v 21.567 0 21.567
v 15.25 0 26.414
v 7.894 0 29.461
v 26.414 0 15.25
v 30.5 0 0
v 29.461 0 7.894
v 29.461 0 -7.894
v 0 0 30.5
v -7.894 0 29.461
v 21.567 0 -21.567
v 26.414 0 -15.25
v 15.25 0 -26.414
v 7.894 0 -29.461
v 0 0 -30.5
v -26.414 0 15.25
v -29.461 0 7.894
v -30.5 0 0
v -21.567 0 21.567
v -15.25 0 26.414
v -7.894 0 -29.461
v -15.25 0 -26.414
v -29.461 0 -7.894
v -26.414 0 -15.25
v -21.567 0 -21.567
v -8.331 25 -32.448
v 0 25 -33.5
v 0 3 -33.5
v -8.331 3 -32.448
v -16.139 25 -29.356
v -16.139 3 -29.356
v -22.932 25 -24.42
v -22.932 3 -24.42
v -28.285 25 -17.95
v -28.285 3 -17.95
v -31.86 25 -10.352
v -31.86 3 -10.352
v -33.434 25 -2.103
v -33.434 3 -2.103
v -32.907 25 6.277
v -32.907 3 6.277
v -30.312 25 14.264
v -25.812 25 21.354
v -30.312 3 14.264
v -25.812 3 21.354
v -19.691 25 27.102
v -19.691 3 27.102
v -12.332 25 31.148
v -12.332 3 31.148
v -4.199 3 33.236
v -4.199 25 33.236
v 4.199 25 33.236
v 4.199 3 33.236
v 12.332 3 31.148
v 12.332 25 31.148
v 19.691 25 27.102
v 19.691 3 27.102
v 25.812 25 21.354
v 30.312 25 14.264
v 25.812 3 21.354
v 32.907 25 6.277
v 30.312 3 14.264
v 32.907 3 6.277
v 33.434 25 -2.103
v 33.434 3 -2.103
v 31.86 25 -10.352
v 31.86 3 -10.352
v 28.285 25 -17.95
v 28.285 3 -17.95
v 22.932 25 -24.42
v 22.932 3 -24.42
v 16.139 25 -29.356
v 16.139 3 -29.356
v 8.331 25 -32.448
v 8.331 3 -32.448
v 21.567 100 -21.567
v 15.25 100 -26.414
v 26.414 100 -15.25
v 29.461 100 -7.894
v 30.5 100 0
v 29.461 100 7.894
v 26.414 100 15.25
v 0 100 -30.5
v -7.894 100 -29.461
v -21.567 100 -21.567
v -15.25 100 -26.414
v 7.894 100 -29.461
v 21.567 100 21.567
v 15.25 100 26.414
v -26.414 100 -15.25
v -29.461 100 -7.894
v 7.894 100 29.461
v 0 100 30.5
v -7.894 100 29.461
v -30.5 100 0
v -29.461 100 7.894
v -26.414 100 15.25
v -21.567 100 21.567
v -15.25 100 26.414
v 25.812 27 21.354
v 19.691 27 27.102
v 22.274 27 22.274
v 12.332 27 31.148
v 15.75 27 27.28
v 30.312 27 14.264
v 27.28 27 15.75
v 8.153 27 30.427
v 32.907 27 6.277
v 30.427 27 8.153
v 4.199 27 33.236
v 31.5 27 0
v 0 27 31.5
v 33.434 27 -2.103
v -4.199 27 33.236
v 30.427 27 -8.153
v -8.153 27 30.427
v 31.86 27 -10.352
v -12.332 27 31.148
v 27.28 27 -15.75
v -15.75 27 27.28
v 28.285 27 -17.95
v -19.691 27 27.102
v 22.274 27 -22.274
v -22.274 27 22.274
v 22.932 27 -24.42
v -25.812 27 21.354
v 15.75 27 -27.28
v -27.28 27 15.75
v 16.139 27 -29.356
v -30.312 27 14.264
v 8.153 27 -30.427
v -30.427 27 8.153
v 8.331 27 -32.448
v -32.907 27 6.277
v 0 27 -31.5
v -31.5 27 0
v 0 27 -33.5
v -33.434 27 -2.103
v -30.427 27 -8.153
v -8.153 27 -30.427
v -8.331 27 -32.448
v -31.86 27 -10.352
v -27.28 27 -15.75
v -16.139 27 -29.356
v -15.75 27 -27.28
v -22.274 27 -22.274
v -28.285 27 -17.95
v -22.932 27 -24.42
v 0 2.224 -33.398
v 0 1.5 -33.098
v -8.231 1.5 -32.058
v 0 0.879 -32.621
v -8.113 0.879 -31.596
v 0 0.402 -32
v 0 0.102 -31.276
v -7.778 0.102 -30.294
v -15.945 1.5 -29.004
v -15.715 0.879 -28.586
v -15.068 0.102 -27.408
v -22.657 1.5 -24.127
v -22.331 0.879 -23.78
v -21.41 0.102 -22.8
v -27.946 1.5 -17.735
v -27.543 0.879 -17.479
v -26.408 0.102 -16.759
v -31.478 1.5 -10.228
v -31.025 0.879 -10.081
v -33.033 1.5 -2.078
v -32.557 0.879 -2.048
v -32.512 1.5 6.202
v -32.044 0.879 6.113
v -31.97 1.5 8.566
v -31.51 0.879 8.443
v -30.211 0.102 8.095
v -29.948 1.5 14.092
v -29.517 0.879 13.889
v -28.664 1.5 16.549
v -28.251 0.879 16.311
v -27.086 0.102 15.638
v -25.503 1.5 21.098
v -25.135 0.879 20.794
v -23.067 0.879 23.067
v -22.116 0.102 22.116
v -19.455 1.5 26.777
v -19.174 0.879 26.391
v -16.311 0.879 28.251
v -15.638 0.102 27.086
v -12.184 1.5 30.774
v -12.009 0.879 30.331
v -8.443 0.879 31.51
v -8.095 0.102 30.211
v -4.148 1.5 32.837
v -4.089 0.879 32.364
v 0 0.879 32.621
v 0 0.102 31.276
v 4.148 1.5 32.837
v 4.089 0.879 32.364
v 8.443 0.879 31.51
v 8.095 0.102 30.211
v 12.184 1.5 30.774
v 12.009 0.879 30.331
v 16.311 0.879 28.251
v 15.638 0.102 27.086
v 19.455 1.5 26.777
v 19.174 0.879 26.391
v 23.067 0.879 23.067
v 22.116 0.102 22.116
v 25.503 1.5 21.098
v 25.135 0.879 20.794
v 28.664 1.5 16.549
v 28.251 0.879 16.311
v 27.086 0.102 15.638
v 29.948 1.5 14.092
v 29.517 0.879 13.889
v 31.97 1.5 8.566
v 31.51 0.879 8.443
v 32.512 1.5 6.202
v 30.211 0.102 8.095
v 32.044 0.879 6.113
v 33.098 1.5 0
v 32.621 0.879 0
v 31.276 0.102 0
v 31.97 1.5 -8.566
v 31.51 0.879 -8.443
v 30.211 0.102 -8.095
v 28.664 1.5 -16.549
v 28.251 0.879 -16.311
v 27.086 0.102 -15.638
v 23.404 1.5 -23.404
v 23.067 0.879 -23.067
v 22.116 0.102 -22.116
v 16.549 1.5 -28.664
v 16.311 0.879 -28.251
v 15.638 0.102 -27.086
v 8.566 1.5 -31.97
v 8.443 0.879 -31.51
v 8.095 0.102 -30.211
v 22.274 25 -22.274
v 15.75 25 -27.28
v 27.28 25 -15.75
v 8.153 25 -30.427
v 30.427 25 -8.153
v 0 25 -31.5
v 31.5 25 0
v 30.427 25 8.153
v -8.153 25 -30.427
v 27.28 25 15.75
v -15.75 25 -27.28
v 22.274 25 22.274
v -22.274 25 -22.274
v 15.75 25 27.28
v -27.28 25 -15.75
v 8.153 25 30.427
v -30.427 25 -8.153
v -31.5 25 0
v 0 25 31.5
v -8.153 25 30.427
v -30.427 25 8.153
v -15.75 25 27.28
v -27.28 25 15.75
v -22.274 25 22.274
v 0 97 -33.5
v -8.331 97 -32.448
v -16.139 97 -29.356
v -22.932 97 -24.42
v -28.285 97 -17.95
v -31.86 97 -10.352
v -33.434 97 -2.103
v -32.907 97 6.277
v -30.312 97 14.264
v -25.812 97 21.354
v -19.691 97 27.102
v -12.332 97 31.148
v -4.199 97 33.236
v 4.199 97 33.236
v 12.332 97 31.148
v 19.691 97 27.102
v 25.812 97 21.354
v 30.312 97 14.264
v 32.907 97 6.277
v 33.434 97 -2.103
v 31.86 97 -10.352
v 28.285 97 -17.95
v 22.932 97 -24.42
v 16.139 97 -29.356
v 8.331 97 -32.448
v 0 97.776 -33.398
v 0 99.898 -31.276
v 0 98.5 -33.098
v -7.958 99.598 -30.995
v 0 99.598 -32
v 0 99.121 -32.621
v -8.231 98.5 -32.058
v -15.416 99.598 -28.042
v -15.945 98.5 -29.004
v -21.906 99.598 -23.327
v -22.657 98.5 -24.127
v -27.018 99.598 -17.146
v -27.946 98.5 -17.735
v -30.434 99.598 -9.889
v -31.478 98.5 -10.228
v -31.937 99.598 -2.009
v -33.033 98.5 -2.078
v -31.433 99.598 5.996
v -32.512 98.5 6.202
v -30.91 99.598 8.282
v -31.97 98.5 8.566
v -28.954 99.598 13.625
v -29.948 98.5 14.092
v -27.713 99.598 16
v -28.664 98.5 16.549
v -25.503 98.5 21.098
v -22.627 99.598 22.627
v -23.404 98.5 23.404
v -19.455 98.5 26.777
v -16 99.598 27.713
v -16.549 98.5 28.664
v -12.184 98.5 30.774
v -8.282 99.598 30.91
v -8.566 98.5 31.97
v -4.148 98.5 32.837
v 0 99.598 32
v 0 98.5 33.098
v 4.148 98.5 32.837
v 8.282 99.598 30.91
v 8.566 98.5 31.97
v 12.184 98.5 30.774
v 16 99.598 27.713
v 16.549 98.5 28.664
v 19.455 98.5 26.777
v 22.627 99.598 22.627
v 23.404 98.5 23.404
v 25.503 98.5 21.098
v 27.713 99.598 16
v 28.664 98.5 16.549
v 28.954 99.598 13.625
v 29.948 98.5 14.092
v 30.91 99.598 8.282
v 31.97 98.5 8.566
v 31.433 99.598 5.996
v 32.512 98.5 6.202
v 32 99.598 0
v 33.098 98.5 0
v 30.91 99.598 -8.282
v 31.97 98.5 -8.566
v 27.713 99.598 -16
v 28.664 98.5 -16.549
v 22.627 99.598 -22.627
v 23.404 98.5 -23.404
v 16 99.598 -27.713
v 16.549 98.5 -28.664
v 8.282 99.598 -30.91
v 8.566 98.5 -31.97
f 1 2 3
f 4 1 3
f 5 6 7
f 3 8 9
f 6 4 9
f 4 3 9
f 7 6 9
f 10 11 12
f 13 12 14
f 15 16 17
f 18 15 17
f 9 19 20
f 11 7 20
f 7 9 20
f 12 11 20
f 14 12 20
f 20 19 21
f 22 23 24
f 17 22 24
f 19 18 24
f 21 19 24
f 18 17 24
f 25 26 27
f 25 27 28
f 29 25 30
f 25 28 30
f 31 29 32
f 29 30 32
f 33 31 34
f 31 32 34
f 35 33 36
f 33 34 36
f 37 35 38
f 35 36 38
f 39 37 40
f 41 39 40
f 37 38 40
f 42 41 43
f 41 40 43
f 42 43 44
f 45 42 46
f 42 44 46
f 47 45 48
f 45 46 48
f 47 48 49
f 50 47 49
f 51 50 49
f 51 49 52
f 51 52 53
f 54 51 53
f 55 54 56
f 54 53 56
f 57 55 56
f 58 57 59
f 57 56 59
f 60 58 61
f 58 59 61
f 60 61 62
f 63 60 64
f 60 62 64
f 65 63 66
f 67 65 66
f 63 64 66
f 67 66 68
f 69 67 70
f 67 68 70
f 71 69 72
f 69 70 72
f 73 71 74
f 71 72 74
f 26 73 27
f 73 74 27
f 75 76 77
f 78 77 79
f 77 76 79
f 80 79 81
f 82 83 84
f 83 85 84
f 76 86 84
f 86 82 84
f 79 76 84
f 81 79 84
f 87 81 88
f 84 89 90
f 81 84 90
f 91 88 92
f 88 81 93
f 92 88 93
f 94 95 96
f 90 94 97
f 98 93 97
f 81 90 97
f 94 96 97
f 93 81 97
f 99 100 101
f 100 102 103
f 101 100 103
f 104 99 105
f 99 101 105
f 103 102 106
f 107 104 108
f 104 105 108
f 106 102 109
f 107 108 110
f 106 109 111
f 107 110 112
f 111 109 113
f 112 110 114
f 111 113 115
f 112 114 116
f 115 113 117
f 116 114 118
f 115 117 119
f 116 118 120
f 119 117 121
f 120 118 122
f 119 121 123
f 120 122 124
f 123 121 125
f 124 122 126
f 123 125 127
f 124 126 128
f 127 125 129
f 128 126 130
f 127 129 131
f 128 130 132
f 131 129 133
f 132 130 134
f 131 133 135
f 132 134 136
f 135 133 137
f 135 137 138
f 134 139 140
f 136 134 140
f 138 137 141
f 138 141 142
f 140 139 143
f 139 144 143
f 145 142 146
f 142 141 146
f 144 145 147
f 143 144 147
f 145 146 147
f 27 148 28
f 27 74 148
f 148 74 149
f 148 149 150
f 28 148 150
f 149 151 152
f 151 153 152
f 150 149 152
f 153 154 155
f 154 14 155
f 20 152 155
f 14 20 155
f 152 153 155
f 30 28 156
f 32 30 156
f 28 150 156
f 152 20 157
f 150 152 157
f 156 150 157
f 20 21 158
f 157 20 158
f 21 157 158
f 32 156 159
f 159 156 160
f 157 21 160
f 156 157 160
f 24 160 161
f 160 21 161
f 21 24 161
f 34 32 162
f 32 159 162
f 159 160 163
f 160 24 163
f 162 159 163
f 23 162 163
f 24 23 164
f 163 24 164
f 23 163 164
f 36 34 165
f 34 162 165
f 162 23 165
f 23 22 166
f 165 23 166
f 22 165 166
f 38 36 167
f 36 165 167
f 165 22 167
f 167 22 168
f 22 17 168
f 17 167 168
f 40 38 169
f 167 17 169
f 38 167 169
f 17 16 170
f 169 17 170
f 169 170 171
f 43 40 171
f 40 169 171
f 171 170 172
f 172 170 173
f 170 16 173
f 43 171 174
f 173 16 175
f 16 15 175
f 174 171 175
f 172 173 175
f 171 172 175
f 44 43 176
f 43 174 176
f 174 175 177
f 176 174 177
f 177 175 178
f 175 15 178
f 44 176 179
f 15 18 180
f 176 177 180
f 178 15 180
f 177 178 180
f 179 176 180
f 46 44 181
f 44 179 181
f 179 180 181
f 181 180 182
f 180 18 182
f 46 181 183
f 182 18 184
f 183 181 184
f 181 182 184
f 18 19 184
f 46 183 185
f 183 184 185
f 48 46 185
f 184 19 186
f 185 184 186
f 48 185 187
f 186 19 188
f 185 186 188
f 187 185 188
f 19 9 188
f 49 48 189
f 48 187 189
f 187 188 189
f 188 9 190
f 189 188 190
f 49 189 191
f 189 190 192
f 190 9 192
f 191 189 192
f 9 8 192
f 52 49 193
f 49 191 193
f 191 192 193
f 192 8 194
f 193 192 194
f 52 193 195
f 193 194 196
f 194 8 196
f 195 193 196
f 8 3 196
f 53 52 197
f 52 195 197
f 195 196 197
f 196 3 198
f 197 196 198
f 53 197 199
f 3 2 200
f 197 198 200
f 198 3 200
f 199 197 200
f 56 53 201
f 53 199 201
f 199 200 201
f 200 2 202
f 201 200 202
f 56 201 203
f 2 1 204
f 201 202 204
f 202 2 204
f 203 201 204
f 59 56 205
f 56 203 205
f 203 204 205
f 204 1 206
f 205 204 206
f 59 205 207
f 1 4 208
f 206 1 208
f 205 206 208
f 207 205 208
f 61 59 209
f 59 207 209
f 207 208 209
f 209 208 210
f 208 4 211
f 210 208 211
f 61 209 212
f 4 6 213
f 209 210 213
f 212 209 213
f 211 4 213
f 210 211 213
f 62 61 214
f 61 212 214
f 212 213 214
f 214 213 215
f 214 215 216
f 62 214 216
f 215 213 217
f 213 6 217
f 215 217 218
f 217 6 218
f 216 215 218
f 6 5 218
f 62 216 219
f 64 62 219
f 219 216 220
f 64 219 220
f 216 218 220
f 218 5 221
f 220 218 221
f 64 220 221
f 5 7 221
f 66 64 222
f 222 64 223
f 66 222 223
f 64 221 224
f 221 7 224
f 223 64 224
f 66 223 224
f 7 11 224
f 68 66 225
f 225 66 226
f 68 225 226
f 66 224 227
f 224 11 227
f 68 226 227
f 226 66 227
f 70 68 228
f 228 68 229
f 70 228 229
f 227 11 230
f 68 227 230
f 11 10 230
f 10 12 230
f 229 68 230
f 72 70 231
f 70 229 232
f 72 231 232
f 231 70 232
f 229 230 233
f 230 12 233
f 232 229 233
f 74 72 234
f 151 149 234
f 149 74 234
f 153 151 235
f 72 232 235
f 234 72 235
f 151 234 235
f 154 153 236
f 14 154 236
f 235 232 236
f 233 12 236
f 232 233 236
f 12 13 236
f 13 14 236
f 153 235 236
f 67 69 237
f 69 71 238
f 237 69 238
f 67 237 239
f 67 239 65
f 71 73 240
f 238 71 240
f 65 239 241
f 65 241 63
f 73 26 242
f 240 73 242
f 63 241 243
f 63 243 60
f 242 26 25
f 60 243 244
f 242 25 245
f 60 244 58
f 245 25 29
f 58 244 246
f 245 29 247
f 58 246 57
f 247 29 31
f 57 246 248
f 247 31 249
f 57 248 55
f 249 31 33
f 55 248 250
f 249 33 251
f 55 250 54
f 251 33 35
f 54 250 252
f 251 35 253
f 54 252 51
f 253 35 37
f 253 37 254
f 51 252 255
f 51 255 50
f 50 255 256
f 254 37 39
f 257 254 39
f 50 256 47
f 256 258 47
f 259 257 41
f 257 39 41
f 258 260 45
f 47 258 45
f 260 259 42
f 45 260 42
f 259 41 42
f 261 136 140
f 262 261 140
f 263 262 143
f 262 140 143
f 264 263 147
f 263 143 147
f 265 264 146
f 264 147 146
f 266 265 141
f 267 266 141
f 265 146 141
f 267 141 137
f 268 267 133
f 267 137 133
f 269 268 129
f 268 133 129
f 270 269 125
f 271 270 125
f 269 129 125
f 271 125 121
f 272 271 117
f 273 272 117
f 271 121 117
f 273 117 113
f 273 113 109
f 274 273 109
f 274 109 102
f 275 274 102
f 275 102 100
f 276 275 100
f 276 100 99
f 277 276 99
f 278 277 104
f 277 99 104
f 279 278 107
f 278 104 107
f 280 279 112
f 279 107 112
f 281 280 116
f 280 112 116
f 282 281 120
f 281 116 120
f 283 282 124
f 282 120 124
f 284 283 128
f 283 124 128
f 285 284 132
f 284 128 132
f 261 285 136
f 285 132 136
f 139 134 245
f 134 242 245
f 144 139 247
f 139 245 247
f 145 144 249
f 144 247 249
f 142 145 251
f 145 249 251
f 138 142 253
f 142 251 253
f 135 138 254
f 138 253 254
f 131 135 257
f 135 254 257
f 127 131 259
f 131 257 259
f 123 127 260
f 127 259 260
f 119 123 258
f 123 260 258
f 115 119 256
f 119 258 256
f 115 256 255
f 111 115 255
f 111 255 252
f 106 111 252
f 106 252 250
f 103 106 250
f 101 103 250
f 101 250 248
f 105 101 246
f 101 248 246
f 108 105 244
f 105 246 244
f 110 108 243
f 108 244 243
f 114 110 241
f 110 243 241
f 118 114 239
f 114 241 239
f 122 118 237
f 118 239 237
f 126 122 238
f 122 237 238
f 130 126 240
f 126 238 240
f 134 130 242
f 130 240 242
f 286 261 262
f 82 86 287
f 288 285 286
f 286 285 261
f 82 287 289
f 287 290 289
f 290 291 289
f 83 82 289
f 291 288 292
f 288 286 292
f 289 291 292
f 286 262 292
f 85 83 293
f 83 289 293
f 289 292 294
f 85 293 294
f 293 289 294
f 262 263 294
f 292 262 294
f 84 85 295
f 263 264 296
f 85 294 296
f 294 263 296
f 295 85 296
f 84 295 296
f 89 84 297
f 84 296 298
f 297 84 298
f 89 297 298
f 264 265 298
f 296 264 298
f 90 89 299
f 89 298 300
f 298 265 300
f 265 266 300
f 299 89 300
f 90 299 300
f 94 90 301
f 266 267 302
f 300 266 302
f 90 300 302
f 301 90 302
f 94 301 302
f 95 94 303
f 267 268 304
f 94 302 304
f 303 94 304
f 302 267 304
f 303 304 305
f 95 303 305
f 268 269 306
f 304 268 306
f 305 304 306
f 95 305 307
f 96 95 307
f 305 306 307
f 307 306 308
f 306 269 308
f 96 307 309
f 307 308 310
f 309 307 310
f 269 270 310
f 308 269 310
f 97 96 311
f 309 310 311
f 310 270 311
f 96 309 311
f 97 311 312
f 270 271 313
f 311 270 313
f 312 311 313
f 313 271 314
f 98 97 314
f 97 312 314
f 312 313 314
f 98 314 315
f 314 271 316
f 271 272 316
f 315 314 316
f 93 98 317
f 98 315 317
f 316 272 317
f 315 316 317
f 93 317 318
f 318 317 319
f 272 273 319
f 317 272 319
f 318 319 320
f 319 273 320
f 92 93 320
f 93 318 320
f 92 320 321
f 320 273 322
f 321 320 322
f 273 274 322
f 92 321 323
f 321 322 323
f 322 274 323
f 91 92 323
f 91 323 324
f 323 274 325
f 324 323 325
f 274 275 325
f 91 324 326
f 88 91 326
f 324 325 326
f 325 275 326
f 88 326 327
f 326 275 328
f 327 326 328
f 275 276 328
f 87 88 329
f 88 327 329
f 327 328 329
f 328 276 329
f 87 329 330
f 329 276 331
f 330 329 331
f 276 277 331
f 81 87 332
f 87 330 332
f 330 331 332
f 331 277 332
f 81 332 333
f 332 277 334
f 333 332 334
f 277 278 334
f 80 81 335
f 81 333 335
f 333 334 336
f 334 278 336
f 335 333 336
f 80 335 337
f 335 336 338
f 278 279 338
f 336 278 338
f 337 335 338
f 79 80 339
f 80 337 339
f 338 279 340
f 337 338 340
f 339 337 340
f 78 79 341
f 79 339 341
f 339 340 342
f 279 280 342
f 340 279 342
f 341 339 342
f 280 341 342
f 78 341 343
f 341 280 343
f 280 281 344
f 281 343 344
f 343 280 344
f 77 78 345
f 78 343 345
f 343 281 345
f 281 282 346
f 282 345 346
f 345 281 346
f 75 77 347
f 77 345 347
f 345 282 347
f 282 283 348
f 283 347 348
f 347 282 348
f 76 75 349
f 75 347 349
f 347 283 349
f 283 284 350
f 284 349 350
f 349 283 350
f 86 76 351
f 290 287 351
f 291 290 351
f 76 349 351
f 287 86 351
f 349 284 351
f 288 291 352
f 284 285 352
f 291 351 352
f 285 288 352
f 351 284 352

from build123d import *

# Parameters (mm, degrees)
FILLET1_R = 3
FILLET2_R = 3


with BuildPart() as part:
    # Sketch2 → Revolve1 (revolve)
    with BuildSketch(Plane(origin=(0, 0, 0), x_dir=(0, 0, -1), z_dir=(1, 0, 0))):
        Polygon((0, 0), (0, 100), (33.5, 100), (33.5, 27), (31.5, 27), (31.5, 25), (33.5, 25), (33.5, 0), align=None)
    revolve(axis=Axis((0, 0, 0), (0, 1, 0)))

    # Fillet1
    fillet1_edges = [part.edges().sort_by_distance(p)[0] for p in [
        (0, 100, 33.5),
    ]]
    fillet(fillet1_edges, radius=FILLET1_R)

    # Fillet2
    fillet2_edges = [part.edges().sort_by_distance(p)[0] for p in [
        (0, 0, 33.5),
    ]]
    fillet(fillet2_edges, radius=FILLET2_R)


solid = part.part
